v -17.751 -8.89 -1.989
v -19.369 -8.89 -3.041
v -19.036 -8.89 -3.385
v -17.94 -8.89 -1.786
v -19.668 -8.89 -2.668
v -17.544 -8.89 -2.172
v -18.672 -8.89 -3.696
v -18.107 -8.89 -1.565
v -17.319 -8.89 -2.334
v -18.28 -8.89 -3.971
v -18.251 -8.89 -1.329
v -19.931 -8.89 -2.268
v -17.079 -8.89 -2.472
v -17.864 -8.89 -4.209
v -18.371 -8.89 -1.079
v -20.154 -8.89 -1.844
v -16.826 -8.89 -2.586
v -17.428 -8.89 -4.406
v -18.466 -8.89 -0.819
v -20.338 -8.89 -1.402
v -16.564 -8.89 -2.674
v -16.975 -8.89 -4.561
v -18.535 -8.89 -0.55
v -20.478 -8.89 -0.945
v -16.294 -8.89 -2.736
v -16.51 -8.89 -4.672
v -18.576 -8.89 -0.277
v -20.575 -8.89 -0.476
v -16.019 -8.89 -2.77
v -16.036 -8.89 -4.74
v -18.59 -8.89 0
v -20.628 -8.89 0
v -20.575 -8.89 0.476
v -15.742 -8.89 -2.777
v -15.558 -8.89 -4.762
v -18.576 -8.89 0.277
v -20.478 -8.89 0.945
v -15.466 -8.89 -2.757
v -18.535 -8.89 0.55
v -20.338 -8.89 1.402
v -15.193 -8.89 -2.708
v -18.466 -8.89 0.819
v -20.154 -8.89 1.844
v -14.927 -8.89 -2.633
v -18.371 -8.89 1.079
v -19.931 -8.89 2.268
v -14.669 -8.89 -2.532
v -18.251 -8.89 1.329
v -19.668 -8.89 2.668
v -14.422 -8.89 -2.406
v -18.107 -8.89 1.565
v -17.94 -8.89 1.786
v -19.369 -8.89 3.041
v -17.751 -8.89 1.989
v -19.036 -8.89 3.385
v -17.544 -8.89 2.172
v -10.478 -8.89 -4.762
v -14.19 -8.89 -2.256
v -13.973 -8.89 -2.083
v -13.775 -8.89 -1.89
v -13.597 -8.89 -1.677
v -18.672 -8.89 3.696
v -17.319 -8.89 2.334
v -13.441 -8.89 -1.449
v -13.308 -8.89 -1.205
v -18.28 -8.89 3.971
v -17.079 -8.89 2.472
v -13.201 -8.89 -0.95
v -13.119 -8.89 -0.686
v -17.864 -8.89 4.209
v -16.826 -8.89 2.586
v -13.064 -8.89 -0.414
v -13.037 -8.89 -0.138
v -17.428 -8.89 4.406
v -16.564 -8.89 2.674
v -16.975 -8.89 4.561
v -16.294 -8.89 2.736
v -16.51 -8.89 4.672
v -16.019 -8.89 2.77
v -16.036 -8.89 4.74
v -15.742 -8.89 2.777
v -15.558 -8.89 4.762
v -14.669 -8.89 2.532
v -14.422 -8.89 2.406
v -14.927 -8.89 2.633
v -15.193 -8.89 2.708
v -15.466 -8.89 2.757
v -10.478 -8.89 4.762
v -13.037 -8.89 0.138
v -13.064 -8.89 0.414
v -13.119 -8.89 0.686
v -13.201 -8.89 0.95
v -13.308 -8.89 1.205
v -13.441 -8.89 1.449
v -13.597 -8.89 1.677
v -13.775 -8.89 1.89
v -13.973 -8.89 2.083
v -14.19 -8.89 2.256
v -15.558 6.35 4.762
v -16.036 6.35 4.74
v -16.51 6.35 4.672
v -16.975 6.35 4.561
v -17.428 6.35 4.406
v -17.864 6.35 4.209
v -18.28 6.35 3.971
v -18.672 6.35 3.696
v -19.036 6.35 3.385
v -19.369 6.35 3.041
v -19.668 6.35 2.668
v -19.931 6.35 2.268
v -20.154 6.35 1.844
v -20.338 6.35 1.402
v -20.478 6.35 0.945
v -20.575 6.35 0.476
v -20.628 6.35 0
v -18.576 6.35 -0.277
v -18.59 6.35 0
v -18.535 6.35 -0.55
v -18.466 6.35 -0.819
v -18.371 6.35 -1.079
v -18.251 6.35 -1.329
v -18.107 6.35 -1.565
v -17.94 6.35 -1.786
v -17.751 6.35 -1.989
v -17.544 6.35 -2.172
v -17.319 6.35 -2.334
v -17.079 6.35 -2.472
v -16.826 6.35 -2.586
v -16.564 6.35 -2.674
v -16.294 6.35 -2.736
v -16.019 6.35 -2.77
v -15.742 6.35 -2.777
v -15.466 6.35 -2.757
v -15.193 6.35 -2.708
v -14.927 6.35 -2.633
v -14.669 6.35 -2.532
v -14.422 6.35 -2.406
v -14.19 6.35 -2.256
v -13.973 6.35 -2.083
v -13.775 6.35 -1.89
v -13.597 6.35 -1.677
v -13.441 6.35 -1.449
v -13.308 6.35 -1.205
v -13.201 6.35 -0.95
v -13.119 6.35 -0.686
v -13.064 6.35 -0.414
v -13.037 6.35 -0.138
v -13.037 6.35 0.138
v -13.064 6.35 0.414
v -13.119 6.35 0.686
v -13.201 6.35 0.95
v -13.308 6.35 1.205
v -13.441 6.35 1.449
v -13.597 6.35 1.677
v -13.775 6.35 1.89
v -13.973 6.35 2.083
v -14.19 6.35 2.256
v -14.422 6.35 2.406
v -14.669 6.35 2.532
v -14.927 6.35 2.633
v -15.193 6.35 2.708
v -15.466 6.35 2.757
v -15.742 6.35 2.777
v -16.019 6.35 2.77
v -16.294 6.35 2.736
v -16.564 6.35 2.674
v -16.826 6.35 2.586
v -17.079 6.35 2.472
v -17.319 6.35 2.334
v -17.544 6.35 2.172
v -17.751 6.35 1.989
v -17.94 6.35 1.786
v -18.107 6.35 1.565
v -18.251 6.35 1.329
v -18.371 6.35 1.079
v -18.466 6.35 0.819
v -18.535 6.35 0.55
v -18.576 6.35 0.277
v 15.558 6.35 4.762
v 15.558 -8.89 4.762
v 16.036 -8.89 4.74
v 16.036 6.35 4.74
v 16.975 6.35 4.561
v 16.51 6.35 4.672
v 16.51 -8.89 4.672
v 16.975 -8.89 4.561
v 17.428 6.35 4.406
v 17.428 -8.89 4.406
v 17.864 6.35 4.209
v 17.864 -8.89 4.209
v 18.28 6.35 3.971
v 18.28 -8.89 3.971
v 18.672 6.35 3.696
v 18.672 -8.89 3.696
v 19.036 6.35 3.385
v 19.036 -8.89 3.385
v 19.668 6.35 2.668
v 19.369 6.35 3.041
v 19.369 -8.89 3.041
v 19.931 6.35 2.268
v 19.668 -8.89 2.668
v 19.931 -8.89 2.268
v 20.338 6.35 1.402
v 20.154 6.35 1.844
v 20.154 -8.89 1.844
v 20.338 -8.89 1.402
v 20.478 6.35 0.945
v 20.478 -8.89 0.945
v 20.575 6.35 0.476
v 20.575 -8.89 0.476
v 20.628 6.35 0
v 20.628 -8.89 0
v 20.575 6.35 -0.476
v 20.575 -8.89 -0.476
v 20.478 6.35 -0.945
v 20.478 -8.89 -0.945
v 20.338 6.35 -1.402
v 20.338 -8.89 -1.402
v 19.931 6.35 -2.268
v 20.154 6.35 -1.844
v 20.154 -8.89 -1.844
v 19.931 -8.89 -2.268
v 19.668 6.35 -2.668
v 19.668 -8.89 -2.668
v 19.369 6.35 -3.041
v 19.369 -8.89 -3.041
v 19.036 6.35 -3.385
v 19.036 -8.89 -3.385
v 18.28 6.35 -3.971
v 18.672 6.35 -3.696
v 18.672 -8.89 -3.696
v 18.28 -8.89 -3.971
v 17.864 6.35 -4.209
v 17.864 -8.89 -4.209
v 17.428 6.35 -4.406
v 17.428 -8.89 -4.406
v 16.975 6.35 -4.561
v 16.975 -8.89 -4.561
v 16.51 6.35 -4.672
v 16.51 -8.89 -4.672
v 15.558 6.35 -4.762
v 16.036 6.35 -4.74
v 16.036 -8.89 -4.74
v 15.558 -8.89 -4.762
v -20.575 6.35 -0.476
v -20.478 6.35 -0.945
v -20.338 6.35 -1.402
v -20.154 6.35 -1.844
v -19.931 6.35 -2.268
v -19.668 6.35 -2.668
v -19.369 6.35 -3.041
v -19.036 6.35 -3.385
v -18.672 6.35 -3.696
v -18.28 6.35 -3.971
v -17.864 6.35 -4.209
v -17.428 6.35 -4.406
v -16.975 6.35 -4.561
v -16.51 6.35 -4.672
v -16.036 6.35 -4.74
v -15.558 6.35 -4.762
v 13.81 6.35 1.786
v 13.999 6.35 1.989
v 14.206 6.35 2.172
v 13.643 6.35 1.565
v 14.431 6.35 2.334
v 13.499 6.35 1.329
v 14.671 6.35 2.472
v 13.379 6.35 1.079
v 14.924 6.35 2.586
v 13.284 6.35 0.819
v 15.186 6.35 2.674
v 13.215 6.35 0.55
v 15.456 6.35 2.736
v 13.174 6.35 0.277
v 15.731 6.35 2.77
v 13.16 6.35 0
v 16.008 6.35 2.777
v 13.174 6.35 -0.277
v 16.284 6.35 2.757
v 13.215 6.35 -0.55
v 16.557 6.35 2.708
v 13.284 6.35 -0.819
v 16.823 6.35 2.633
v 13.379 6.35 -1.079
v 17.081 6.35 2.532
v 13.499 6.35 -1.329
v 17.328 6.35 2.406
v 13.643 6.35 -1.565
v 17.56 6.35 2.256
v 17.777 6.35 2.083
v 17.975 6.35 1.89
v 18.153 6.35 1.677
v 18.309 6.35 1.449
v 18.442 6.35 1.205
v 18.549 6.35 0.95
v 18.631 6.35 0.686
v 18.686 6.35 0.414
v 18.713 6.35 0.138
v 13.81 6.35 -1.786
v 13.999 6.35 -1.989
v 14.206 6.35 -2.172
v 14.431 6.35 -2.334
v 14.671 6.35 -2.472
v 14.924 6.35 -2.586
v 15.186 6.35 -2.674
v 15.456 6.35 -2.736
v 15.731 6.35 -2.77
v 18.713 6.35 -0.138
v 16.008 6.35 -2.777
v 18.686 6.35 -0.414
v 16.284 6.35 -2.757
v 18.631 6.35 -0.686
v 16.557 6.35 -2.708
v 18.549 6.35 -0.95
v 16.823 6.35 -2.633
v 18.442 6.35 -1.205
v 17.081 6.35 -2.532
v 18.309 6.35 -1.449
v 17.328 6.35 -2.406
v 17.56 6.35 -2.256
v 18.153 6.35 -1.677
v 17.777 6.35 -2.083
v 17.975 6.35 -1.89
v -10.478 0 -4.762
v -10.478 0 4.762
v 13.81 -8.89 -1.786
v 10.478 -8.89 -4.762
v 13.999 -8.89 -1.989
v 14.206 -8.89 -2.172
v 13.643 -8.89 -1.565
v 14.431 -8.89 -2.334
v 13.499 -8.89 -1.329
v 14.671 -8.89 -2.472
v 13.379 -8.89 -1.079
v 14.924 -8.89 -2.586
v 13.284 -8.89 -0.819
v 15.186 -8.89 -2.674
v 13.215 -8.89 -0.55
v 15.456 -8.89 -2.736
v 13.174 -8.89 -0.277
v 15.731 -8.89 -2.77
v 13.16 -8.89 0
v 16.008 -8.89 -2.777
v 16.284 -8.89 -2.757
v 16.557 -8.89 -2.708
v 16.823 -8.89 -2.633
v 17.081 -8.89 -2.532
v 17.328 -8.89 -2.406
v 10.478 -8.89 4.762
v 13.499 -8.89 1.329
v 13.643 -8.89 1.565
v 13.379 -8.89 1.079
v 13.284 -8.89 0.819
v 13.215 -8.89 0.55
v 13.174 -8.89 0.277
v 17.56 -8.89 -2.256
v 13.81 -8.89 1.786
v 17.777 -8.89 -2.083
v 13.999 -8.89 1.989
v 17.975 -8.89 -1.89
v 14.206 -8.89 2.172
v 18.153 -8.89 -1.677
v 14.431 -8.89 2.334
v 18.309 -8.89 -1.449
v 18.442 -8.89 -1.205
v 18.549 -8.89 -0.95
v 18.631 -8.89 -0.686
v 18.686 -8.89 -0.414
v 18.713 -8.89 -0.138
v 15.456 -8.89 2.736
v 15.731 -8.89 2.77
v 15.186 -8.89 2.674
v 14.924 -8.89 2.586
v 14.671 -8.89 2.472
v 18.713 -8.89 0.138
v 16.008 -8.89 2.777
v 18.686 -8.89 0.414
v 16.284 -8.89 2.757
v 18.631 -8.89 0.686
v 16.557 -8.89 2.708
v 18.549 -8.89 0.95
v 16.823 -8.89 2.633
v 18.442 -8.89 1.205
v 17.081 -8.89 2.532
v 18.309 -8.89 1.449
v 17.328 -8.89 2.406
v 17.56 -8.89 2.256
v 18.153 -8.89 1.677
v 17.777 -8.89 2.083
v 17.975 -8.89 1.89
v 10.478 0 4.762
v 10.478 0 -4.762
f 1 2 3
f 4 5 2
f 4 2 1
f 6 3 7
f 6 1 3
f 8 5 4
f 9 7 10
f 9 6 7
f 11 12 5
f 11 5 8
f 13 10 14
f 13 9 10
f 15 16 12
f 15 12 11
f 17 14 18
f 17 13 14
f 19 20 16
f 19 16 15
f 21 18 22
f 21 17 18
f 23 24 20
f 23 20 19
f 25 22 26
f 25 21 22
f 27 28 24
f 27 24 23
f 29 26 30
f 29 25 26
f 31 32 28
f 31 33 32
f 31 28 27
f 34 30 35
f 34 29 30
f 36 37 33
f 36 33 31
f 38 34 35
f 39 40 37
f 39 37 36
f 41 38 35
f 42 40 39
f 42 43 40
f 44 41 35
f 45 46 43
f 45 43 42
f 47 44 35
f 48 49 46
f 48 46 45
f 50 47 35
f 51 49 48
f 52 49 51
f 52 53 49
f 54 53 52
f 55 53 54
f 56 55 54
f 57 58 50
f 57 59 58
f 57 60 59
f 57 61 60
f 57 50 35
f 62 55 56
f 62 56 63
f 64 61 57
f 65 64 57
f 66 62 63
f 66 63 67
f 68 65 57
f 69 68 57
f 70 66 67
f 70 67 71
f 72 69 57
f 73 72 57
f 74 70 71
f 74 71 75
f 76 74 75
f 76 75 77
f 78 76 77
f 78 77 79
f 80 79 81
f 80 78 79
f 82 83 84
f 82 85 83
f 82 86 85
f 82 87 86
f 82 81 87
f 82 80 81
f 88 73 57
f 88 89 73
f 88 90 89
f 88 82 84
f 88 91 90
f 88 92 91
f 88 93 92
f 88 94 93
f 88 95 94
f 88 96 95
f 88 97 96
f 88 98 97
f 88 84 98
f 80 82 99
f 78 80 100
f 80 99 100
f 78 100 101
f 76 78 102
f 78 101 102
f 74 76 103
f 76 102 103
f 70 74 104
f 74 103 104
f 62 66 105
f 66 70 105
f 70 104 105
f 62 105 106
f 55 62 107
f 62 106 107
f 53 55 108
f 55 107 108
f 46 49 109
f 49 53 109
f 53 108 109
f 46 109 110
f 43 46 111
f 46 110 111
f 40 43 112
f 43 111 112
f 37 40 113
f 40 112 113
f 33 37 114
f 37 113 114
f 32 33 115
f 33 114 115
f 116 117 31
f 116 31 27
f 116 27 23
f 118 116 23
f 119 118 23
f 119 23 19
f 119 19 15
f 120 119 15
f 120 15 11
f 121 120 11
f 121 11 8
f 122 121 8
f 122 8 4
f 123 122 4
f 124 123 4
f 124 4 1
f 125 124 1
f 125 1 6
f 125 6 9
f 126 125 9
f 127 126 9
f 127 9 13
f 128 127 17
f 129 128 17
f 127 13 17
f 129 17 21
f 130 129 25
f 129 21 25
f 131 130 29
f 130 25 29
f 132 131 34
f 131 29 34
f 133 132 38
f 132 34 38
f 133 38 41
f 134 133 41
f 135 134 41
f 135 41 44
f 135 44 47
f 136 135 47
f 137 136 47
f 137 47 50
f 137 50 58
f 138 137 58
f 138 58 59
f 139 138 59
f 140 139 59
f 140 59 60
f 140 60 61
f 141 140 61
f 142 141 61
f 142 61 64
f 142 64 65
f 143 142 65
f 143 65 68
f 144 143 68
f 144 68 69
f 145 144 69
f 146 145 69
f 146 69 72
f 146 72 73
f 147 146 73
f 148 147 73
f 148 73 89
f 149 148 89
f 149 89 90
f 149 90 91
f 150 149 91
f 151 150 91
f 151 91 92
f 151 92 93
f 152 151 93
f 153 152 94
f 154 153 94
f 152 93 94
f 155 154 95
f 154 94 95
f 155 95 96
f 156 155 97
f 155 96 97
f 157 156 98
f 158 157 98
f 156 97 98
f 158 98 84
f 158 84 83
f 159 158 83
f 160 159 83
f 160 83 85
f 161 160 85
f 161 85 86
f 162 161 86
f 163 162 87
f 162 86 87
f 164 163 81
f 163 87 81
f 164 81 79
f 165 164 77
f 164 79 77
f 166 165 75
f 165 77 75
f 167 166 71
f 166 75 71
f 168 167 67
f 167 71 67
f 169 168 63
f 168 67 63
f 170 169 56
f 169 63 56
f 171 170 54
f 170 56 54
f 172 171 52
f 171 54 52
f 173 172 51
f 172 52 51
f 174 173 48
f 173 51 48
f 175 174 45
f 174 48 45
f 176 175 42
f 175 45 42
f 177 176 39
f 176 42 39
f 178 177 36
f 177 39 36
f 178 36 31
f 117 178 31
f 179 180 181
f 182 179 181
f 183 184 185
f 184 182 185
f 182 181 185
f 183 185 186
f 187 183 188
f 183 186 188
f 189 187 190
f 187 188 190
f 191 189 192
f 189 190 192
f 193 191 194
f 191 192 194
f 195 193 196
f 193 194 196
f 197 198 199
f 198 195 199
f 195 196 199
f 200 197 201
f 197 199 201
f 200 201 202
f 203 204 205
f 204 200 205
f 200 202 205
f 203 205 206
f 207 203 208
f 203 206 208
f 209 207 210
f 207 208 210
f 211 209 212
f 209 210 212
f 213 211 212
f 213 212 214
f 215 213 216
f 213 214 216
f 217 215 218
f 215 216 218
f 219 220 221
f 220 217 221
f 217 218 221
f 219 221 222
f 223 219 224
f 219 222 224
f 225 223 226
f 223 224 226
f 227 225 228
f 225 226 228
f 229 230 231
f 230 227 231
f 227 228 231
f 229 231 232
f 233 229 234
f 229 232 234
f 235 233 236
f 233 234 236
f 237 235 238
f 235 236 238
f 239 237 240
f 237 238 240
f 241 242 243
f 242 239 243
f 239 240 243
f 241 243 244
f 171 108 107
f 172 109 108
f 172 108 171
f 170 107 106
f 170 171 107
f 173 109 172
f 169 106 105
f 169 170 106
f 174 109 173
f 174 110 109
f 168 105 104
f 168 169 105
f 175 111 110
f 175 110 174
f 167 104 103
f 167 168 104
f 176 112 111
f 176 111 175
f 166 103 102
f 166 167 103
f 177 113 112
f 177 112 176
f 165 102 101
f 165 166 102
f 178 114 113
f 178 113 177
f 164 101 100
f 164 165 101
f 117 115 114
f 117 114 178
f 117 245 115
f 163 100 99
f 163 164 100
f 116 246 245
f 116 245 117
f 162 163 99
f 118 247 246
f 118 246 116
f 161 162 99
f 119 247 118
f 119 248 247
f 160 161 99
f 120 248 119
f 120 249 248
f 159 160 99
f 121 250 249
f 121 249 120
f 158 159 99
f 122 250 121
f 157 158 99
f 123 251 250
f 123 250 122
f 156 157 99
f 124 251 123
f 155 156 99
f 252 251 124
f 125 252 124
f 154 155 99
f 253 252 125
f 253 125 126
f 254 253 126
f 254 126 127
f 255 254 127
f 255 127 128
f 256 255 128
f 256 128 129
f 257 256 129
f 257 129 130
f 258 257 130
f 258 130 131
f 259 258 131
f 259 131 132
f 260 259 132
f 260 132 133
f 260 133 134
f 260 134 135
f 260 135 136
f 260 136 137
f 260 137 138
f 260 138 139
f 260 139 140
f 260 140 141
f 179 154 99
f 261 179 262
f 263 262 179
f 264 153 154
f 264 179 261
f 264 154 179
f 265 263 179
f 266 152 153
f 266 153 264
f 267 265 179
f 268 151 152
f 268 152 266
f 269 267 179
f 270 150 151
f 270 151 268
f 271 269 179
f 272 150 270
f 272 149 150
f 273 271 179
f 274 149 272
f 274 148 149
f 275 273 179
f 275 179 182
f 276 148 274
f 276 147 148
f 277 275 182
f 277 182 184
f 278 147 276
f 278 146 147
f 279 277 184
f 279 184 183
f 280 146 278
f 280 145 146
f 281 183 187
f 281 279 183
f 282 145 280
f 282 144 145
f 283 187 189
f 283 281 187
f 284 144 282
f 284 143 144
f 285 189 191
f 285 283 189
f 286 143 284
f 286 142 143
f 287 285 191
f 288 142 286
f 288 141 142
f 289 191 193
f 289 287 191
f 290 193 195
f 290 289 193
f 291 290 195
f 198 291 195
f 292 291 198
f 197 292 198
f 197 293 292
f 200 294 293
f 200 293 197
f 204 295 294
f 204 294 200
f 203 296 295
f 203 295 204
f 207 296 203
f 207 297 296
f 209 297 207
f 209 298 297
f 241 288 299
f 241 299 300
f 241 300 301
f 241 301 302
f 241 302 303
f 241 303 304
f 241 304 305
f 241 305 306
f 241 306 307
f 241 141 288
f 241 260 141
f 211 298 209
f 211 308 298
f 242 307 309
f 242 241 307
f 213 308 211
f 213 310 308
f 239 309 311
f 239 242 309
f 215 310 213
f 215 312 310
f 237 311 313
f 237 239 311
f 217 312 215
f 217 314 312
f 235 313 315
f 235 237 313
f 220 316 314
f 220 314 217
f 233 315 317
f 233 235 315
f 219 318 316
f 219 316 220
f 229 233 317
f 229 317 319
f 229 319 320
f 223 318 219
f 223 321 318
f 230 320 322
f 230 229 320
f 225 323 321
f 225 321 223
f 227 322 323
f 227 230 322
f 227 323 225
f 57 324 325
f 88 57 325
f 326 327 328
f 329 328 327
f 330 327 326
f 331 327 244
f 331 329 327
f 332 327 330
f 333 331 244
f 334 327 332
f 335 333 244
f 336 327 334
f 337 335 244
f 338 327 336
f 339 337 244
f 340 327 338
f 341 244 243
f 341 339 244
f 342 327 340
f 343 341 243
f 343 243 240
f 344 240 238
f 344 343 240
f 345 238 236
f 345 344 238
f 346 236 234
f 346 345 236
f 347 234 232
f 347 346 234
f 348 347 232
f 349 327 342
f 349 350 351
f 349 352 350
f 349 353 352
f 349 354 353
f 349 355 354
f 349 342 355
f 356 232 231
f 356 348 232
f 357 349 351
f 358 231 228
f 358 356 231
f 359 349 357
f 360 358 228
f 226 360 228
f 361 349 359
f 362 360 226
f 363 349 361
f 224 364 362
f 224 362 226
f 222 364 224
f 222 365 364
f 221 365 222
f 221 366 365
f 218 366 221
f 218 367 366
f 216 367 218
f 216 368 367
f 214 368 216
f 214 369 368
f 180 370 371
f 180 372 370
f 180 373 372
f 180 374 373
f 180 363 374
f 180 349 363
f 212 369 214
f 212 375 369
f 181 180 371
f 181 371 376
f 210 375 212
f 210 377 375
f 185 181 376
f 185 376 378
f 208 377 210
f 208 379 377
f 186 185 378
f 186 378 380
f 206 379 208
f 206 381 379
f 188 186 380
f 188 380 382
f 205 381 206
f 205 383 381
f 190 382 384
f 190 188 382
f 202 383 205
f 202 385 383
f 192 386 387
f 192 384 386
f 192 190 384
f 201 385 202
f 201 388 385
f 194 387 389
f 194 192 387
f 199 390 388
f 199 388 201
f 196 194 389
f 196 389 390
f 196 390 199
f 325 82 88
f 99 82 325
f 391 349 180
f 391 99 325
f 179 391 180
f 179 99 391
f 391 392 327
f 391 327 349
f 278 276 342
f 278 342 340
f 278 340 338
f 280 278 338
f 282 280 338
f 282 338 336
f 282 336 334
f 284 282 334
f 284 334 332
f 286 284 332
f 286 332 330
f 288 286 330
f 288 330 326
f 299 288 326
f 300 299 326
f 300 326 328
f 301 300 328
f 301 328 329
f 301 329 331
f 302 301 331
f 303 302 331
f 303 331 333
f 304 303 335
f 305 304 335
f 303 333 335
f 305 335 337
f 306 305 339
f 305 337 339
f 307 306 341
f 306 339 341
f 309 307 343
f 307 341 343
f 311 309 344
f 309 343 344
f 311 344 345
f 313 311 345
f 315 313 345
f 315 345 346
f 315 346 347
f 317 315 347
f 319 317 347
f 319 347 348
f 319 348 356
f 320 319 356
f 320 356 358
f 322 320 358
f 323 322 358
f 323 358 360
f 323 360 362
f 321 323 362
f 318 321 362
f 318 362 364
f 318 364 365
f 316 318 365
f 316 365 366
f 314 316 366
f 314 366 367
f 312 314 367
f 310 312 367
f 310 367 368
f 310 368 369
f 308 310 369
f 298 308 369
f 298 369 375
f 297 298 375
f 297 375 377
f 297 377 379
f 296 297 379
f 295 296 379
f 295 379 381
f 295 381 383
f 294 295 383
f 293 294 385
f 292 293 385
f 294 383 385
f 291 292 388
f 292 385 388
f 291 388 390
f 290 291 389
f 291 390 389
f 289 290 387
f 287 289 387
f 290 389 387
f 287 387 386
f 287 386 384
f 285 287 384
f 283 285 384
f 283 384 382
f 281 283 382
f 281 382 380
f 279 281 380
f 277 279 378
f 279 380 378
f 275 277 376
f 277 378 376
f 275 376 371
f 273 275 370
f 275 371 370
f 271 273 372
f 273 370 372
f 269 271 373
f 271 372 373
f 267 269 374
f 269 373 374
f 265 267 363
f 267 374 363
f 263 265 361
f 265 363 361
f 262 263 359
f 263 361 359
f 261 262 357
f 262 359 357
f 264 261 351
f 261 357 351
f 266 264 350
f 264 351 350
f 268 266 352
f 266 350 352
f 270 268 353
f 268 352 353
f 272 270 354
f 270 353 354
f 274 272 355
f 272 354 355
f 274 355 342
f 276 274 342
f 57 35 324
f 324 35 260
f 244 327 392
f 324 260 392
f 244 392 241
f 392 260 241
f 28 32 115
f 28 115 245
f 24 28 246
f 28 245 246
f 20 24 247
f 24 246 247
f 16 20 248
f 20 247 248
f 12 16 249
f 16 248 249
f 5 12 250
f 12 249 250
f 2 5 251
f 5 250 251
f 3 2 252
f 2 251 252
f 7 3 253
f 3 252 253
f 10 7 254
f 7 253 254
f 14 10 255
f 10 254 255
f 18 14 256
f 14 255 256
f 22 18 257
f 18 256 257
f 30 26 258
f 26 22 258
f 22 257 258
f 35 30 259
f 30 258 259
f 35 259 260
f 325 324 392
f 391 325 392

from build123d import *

# Parameters (mm, degrees)
SKETCH1_W                       = 41.275
SKETCH1_H                       = 9.525
BOSS_EXTRUDE1_DEPTH             = 6.35
SKETCH2_W                       = 10.16
SKETCH2_H                       = 9.525
BOSS_EXTRUDE2_DEPTH             = 8.89
F_7_32_0_21875_DIAMETER_HOLE1_D = 5.55625
FILLET1_R                       = 5.08


with BuildPart() as part:
    # Sketch1 → Boss-Extrude1 (new body)
    with BuildSketch(Plane(origin=(0, 0, 0), x_dir=(1, 0, 0), z_dir=(0, 1, 0))):
        Rectangle(SKETCH1_W, SKETCH1_H)
    extrude(amount=BOSS_EXTRUDE1_DEPTH)

    # Sketch2 → Boss-Extrude2 (add)
    with BuildSketch(Plane.XZ):
        with Locations((-15.5575, 0)):
            Rectangle(SKETCH2_W, SKETCH2_H)
        with Locations((15.5575, 0)):
            Rectangle(SKETCH2_W, SKETCH2_H)
    extrude(amount=BOSS_EXTRUDE2_DEPTH)

    # 7/32 (0.21875) Diameter Hole1 (through all)
    with Locations(Plane(origin=(0, 6.35, 0), x_dir=(1, 0, 0), z_dir=(0, 1, 0))):
        with Locations((-15.8115, 0), (15.9385, 0)):
            Hole(F_7_32_0_21875_DIAMETER_HOLE1_D / 2)

    # Fillet1
    # the kernel refuses this fillet: 5.08 mm, written as the material it takes off along each edge
    with BuildSketch(Plane(origin=(20.6375, -21.59, -4.7625), x_dir=(0, 0, 1), z_dir=(0, 1, 0)), Plane(origin=(20.6375, -21.59, 4.7625), x_dir=(-1, 0, 0), z_dir=(0, 1, 0)), Plane(origin=(-20.6375, 19.05, -4.7625), x_dir=(0, 0, 1), z_dir=(0, -1, 0)), Plane(origin=(-20.6375, 19.05, 4.7625), x_dir=(1, 0, 0), z_dir=(0, -1, 0))) as fillet1_piece_1:
        with BuildLine():
            CenterArc((FILLET1_R, -FILLET1_R), FILLET1_R, 90, 90)
            Line((0, -FILLET1_R), (0, 0))
            Line((0, 0), (FILLET1_R, 0))
        make_face()
    extrude(amount=40.64, mode=Mode.SUBTRACT)


solid = part.part
